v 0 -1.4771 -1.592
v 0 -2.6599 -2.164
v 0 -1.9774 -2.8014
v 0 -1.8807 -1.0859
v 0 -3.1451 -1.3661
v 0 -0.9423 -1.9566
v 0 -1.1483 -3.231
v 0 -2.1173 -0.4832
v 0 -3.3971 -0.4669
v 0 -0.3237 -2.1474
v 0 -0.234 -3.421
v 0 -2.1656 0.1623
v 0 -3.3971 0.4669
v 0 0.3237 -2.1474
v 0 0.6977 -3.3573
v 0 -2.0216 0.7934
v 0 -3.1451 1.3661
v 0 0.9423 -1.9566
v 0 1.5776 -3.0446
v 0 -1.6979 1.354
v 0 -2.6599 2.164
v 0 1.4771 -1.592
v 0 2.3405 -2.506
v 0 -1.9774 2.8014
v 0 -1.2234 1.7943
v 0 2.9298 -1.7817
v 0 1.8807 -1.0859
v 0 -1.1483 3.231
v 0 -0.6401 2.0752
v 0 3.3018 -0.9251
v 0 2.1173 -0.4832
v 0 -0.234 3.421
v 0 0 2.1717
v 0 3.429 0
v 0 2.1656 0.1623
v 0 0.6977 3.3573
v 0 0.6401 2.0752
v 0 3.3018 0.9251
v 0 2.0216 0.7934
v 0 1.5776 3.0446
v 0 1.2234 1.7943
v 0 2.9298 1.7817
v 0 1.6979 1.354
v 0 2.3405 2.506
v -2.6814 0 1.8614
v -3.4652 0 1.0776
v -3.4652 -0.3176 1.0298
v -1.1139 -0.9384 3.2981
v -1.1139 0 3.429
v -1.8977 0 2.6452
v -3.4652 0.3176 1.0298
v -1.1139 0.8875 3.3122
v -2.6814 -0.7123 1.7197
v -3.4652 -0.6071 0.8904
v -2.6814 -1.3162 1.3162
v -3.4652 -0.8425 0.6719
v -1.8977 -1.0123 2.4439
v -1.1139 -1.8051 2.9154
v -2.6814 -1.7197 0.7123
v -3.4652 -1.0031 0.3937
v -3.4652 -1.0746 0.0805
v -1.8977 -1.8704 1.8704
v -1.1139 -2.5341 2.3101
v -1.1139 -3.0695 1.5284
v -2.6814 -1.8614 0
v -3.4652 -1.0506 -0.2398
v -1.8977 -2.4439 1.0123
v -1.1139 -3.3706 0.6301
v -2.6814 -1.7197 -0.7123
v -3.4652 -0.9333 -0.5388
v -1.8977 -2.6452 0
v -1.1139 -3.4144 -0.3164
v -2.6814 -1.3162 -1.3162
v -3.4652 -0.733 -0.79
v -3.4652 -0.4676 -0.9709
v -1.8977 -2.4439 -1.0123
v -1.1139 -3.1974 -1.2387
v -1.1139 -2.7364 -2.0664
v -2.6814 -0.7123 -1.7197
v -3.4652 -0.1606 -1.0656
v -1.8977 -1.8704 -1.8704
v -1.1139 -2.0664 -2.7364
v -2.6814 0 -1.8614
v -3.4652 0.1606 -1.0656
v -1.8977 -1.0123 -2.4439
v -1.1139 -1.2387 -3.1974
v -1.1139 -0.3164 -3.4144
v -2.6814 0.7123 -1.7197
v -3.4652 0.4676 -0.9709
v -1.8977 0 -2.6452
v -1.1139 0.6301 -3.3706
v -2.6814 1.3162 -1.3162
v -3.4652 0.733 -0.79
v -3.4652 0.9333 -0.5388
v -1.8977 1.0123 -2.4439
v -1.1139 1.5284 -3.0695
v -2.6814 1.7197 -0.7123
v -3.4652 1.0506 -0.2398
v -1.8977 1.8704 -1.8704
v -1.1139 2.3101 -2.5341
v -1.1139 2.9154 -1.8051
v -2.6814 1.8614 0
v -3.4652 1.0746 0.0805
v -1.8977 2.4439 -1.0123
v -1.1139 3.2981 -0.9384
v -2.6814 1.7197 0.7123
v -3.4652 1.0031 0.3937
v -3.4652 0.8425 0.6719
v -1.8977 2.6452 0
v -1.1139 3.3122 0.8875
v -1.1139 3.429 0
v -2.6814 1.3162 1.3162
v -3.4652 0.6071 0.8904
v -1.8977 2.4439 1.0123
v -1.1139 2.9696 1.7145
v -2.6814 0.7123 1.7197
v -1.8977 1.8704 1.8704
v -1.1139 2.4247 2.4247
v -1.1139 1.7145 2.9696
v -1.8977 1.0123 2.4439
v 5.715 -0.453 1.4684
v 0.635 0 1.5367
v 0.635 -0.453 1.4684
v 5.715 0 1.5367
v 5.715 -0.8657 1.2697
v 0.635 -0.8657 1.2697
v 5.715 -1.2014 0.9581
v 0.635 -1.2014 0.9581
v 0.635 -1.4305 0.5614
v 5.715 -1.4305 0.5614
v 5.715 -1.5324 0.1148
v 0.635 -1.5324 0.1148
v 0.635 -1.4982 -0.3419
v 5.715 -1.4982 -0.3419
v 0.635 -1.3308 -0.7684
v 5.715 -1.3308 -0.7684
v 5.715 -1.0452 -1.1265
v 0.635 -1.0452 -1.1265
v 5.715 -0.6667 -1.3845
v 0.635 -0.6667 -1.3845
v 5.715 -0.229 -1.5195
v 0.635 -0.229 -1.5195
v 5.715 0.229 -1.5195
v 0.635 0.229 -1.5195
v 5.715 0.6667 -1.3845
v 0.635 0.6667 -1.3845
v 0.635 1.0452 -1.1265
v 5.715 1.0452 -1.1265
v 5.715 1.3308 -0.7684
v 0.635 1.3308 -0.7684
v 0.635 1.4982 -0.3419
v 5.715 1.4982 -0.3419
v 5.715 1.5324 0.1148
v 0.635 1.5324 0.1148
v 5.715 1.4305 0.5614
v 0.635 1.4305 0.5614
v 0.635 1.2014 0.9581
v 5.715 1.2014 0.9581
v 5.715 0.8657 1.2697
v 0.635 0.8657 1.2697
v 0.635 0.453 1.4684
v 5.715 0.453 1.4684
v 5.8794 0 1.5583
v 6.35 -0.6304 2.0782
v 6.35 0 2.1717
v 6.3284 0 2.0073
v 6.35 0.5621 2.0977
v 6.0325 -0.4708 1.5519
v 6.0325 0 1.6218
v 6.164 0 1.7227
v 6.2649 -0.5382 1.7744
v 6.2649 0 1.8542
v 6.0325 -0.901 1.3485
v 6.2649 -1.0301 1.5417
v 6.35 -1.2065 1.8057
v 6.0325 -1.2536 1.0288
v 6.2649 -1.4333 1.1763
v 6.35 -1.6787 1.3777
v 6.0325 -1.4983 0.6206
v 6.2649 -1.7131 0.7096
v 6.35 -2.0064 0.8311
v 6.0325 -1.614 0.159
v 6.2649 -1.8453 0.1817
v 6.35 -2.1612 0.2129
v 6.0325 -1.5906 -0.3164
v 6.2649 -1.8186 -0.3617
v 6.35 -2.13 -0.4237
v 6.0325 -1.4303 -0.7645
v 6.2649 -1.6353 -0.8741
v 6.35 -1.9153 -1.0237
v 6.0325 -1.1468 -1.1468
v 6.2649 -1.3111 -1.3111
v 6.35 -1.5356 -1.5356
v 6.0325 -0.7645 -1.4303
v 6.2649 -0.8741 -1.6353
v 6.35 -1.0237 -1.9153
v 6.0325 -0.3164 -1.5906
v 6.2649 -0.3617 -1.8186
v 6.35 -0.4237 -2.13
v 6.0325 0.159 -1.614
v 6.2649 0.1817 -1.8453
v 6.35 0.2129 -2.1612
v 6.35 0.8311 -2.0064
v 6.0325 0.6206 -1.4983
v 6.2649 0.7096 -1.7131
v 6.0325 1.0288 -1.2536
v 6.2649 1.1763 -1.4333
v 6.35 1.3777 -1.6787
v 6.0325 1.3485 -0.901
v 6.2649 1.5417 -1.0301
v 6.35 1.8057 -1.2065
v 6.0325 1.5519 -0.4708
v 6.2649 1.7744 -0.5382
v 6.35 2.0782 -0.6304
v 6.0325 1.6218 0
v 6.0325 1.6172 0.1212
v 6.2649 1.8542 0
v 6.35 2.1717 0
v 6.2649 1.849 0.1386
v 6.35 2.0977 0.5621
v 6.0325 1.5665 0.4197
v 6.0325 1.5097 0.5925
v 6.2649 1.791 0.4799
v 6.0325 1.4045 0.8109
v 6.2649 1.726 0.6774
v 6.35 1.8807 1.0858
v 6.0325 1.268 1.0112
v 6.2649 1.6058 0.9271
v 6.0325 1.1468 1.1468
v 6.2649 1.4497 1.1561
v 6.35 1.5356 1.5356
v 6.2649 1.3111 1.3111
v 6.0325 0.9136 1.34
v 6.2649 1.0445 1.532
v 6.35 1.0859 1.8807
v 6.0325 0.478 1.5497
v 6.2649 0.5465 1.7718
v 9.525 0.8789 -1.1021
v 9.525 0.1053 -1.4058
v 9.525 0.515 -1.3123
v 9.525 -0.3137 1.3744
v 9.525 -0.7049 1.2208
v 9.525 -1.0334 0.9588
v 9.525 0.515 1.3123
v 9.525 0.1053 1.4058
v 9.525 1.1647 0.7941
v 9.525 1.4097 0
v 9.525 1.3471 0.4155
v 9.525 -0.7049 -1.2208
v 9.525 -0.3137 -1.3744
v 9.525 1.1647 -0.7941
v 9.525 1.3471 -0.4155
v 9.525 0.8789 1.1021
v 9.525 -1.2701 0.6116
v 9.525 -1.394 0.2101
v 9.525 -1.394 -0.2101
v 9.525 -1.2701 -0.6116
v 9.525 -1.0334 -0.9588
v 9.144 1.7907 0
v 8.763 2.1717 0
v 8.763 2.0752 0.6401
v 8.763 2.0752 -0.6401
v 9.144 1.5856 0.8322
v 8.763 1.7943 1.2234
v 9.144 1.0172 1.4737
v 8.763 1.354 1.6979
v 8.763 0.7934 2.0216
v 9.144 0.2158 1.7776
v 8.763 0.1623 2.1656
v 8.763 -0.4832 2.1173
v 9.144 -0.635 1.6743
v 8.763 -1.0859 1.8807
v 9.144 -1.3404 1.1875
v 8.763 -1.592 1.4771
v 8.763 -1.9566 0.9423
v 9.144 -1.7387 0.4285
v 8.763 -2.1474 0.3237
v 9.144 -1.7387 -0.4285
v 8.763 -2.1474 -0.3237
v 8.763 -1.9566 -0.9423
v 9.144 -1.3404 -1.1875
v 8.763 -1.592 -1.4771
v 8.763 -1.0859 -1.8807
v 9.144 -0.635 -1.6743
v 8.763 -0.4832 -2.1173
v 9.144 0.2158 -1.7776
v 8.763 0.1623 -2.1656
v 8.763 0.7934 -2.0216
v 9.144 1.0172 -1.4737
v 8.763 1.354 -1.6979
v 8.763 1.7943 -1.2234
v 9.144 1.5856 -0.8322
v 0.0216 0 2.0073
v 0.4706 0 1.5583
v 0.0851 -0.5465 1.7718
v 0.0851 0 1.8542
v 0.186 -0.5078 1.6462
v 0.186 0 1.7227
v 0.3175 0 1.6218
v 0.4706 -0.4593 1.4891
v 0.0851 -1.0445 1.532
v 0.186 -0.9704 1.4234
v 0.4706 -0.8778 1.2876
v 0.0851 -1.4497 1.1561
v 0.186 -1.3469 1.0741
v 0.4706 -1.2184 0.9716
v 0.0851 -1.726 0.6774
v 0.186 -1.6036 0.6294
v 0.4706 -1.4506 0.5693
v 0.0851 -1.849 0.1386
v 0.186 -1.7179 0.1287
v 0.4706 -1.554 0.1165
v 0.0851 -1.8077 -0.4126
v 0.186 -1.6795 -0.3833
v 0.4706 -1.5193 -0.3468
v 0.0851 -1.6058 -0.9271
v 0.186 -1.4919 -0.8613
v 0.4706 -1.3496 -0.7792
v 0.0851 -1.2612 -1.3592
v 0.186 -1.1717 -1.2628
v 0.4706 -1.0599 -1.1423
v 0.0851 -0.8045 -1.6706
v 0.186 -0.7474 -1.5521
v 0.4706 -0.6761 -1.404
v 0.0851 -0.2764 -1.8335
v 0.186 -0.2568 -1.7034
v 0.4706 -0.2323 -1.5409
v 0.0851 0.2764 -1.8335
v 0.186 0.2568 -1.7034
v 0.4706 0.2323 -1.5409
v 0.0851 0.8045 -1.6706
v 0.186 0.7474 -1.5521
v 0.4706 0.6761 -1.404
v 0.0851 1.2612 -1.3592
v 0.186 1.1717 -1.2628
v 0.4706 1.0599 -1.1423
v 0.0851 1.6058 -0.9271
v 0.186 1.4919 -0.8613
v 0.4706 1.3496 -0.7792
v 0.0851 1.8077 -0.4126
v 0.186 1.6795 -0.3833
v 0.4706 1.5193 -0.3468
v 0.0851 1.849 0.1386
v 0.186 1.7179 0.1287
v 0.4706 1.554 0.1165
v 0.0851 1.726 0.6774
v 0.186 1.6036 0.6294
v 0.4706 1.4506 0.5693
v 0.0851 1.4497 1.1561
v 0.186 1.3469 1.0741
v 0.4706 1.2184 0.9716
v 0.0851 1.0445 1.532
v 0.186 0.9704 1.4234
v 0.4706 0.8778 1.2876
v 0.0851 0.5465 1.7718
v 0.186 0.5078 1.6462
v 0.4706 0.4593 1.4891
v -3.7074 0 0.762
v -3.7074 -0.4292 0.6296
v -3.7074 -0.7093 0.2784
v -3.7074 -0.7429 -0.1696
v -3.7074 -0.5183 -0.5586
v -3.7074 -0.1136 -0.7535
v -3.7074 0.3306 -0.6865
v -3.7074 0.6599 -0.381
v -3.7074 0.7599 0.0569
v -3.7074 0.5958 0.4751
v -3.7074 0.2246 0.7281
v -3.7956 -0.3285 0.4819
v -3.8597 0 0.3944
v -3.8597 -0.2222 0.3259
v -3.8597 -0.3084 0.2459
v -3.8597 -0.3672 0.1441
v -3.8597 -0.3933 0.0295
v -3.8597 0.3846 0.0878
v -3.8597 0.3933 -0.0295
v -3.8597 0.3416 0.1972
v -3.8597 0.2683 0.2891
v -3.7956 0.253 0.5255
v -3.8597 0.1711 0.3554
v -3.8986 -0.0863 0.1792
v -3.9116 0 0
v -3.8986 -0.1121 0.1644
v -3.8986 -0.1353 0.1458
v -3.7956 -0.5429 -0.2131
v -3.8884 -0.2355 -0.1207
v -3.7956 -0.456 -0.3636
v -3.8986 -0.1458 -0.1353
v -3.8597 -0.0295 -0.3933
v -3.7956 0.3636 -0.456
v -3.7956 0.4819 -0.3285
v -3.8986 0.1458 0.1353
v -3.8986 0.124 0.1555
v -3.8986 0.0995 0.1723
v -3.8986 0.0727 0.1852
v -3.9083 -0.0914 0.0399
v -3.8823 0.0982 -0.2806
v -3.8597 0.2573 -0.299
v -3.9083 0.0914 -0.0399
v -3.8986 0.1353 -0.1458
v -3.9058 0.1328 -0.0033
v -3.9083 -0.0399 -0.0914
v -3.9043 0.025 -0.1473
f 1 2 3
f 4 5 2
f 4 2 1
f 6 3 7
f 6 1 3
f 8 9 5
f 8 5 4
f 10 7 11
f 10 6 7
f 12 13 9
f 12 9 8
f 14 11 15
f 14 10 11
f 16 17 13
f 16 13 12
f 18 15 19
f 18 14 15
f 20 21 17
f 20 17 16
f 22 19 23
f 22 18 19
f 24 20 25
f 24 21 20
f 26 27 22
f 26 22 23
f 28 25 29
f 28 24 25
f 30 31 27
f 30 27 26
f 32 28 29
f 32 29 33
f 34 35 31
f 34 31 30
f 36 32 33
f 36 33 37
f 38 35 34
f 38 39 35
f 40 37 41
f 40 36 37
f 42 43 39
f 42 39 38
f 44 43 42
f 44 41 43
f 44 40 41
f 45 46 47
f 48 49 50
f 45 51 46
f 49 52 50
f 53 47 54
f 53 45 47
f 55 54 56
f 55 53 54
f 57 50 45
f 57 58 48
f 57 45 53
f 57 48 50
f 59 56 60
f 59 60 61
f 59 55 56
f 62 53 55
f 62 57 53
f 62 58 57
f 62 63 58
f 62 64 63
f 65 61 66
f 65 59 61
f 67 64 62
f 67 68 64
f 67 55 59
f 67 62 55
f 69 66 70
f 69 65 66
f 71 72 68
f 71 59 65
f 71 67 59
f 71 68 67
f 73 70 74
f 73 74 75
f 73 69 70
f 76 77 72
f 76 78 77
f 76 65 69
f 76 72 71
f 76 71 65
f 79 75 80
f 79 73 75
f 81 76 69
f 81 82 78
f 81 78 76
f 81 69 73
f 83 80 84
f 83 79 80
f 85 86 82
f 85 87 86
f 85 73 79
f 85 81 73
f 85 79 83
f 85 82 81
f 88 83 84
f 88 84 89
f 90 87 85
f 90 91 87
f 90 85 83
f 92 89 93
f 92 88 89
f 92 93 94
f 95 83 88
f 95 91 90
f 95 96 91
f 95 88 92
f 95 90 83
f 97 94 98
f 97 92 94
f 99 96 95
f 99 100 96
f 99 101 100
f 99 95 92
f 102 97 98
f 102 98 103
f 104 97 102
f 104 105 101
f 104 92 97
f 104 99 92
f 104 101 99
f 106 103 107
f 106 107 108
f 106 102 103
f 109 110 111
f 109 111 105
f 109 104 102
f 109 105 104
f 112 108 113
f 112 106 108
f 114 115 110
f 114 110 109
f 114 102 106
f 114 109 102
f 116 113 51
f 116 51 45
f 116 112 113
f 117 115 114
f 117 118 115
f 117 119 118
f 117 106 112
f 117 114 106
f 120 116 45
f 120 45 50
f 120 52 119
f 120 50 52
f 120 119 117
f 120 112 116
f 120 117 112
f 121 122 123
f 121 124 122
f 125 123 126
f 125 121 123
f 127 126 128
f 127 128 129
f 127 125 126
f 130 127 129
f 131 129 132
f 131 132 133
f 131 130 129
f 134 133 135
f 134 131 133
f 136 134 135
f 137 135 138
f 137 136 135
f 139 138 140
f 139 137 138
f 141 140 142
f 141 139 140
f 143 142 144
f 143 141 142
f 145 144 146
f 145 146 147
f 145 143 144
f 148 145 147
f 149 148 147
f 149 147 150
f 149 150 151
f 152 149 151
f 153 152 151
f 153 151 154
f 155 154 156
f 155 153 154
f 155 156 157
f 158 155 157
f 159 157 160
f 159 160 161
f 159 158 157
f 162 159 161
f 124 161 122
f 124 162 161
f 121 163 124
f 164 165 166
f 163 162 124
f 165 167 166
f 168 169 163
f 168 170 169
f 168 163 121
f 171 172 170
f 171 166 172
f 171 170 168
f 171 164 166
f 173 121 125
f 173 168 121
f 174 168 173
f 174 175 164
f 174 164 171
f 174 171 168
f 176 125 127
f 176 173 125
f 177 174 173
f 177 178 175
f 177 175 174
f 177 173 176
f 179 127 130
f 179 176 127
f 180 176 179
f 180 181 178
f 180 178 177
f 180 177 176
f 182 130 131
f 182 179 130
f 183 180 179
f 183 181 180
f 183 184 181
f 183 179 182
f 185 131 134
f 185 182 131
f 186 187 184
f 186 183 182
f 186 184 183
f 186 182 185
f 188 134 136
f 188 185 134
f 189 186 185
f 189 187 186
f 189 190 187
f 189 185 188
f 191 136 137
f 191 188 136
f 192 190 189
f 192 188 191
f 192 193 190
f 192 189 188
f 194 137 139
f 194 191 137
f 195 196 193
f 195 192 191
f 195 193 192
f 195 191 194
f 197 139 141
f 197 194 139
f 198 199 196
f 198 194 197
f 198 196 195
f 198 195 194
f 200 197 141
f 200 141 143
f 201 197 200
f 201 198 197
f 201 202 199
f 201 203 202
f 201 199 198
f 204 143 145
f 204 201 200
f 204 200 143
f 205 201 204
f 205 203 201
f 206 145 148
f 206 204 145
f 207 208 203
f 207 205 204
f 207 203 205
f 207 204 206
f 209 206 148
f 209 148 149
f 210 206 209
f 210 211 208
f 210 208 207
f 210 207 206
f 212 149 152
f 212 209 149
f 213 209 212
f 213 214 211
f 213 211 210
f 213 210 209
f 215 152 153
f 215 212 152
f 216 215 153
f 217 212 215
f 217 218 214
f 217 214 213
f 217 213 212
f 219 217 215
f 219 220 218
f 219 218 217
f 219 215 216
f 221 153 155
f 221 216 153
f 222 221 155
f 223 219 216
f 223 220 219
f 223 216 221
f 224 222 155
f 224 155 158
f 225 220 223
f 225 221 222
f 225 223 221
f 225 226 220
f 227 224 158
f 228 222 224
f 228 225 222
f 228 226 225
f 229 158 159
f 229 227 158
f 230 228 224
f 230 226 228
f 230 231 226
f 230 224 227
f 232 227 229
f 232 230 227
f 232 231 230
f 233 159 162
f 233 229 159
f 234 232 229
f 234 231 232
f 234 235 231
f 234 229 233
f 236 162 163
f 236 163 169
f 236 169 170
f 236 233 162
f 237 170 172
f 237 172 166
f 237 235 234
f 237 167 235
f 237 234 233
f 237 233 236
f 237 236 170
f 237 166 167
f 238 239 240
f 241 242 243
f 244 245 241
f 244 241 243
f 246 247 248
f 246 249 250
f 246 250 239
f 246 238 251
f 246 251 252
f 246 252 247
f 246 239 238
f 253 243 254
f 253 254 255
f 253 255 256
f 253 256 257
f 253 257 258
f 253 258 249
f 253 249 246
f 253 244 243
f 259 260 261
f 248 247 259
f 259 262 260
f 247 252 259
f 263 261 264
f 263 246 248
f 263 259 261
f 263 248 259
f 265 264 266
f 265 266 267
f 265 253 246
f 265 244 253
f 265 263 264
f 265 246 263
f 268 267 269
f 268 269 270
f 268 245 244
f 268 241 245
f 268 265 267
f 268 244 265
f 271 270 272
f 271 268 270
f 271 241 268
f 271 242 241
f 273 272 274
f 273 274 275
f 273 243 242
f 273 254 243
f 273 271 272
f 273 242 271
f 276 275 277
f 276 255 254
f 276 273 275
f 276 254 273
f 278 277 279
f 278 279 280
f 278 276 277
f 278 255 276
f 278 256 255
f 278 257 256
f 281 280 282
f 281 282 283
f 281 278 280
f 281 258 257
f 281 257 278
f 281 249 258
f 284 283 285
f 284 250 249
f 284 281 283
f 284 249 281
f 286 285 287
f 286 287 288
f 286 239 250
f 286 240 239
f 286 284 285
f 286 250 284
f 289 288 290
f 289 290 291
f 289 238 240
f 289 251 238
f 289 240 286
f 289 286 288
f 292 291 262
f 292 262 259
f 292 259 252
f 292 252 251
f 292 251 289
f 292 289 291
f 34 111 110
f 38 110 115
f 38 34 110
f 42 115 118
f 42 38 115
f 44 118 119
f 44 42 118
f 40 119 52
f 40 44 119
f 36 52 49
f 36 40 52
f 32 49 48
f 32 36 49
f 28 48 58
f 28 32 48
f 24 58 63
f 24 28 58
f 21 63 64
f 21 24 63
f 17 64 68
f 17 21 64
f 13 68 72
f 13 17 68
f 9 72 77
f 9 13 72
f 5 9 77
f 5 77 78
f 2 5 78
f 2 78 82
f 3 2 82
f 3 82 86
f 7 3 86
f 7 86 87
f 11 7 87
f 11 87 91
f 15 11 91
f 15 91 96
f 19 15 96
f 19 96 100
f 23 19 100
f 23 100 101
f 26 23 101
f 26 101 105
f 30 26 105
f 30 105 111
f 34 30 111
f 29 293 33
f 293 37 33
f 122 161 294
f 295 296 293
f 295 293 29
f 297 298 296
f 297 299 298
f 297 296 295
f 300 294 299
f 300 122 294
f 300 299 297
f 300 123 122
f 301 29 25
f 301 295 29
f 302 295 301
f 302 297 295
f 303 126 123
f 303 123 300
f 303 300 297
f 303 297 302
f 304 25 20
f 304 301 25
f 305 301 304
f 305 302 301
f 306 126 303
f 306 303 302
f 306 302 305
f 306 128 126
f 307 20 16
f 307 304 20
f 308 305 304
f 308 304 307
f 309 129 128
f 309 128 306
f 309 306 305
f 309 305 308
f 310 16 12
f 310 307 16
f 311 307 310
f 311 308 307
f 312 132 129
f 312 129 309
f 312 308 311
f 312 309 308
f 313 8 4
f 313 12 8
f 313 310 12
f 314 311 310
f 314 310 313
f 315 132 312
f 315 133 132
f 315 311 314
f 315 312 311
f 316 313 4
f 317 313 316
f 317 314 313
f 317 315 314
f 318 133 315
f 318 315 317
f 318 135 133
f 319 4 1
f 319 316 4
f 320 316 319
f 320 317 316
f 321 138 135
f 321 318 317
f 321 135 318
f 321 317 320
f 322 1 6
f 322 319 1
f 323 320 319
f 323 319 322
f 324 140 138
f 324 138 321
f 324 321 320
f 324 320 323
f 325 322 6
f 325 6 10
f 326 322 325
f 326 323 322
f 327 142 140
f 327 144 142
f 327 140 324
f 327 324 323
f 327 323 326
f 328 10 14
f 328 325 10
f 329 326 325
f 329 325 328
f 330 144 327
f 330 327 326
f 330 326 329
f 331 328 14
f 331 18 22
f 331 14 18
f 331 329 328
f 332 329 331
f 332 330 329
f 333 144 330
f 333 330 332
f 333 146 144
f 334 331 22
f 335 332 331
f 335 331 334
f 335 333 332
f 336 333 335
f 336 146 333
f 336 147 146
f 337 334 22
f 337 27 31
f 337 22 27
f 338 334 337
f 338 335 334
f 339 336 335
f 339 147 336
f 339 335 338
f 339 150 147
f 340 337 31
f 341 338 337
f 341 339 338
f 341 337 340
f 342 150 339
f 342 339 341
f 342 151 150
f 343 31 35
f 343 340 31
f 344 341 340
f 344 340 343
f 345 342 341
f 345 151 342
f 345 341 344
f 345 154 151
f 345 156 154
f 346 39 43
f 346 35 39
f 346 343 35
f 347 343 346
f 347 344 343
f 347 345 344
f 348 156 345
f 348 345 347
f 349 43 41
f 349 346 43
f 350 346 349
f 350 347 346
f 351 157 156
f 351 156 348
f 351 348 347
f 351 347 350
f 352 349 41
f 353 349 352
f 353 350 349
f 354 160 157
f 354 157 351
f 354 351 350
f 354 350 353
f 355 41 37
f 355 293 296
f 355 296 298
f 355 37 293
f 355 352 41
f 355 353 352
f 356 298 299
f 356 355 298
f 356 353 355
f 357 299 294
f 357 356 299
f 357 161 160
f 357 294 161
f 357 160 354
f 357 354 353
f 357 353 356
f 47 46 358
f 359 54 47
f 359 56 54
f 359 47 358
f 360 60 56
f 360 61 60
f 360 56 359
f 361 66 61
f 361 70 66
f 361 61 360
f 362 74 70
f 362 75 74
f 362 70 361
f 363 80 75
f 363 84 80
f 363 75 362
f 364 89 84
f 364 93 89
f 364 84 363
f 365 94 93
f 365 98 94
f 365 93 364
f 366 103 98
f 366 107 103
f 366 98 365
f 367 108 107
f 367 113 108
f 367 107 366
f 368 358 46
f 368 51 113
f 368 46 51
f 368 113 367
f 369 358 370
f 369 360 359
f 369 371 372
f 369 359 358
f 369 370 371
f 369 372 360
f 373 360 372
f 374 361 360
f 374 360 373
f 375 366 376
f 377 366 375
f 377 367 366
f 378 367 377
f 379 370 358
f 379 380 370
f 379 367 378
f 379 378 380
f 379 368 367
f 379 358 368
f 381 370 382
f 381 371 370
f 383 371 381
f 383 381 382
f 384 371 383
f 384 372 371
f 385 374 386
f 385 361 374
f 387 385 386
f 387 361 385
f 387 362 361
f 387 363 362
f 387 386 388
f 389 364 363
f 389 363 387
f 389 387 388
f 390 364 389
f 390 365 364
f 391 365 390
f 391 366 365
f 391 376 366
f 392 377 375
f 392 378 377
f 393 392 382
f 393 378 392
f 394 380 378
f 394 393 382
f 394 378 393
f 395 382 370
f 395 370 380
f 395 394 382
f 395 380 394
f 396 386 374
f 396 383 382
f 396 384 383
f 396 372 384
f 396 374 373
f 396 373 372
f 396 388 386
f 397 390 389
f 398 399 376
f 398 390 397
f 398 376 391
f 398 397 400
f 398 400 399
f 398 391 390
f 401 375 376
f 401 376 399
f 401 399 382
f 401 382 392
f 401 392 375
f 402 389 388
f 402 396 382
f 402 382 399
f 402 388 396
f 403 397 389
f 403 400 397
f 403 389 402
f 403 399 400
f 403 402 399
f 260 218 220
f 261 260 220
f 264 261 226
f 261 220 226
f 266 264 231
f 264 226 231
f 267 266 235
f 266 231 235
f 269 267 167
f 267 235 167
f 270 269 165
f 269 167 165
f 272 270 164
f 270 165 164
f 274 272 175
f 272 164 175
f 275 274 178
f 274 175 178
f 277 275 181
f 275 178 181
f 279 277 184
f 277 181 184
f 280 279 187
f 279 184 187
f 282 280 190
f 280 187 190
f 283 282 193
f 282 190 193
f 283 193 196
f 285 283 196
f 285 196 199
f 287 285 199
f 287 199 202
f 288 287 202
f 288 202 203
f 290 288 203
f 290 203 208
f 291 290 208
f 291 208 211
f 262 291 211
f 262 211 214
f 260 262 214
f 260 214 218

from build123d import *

# Parameters (mm, degrees)
F0_R     = 2.1717
F1_DEPTH = 9.525
F0_R_2   = 3.429
F2_DEPTH = 3.937
F5_SIZE  = 0.762


with BuildPart() as f1:
    # F0 (on Right) → F1 (new body)
    with BuildSketch(Plane.YZ):
        Circle(F0_R)
    extrude(amount=F1_DEPTH)

    # F0 (on Right) → F2 (join)
    with BuildSketch(Plane.YZ):
        Circle(F0_R_2)
        Circle(F0_R, mode=Mode.SUBTRACT)
        Circle(F0_R)
    extrude(amount=-F2_DEPTH)

    # F3 (on Front) → F4 (revolve, cut)
    with BuildSketch(Plane.XZ):
        with BuildLine():
            Line((6.35, 2.1717), (0, 2.1717))
            ThreePointArc((0, 2.1717), (0.185987, 1.722687), (0.635, 1.5367))
            Line((0.635, 1.5367), (5.715, 1.5367))
            ThreePointArc((5.715, 1.5367), (6.164013, 1.722687), (6.35, 2.1717))
        make_face()
    revolve(axis=Axis((3.39265, 0, 0), (1, 0, 0)), mode=Mode.SUBTRACT)

    # F5
    f5_edges = [f1.edges().sort_by_distance(p)[0] for p in [
        (9.525, -2.1717, 0),
    ]]
    chamfer(f5_edges, length=F5_SIZE)

    # F6 (on Front) → F7 (revolve, cut)
    with BuildSketch(Plane.XZ):
        with BuildLine():
            Line((-1.113861, 3.429), (-3.937, 3.429))
            Line((-3.937, 3.429), (-3.937, 0))
            Line((-3.937, 0), (-3.9116, 0))
            ThreePointArc((-3.9116, 0), (-3.795592, 0.58321), (-3.465231, 1.077631))
            Line((-3.465231, 1.077631), (-1.113861, 3.429))
        make_face()
    revolve(axis=Axis((-3.9243, 0, 0), (1, 0, 0)), mode=Mode.SUBTRACT)


solid = f1.part
